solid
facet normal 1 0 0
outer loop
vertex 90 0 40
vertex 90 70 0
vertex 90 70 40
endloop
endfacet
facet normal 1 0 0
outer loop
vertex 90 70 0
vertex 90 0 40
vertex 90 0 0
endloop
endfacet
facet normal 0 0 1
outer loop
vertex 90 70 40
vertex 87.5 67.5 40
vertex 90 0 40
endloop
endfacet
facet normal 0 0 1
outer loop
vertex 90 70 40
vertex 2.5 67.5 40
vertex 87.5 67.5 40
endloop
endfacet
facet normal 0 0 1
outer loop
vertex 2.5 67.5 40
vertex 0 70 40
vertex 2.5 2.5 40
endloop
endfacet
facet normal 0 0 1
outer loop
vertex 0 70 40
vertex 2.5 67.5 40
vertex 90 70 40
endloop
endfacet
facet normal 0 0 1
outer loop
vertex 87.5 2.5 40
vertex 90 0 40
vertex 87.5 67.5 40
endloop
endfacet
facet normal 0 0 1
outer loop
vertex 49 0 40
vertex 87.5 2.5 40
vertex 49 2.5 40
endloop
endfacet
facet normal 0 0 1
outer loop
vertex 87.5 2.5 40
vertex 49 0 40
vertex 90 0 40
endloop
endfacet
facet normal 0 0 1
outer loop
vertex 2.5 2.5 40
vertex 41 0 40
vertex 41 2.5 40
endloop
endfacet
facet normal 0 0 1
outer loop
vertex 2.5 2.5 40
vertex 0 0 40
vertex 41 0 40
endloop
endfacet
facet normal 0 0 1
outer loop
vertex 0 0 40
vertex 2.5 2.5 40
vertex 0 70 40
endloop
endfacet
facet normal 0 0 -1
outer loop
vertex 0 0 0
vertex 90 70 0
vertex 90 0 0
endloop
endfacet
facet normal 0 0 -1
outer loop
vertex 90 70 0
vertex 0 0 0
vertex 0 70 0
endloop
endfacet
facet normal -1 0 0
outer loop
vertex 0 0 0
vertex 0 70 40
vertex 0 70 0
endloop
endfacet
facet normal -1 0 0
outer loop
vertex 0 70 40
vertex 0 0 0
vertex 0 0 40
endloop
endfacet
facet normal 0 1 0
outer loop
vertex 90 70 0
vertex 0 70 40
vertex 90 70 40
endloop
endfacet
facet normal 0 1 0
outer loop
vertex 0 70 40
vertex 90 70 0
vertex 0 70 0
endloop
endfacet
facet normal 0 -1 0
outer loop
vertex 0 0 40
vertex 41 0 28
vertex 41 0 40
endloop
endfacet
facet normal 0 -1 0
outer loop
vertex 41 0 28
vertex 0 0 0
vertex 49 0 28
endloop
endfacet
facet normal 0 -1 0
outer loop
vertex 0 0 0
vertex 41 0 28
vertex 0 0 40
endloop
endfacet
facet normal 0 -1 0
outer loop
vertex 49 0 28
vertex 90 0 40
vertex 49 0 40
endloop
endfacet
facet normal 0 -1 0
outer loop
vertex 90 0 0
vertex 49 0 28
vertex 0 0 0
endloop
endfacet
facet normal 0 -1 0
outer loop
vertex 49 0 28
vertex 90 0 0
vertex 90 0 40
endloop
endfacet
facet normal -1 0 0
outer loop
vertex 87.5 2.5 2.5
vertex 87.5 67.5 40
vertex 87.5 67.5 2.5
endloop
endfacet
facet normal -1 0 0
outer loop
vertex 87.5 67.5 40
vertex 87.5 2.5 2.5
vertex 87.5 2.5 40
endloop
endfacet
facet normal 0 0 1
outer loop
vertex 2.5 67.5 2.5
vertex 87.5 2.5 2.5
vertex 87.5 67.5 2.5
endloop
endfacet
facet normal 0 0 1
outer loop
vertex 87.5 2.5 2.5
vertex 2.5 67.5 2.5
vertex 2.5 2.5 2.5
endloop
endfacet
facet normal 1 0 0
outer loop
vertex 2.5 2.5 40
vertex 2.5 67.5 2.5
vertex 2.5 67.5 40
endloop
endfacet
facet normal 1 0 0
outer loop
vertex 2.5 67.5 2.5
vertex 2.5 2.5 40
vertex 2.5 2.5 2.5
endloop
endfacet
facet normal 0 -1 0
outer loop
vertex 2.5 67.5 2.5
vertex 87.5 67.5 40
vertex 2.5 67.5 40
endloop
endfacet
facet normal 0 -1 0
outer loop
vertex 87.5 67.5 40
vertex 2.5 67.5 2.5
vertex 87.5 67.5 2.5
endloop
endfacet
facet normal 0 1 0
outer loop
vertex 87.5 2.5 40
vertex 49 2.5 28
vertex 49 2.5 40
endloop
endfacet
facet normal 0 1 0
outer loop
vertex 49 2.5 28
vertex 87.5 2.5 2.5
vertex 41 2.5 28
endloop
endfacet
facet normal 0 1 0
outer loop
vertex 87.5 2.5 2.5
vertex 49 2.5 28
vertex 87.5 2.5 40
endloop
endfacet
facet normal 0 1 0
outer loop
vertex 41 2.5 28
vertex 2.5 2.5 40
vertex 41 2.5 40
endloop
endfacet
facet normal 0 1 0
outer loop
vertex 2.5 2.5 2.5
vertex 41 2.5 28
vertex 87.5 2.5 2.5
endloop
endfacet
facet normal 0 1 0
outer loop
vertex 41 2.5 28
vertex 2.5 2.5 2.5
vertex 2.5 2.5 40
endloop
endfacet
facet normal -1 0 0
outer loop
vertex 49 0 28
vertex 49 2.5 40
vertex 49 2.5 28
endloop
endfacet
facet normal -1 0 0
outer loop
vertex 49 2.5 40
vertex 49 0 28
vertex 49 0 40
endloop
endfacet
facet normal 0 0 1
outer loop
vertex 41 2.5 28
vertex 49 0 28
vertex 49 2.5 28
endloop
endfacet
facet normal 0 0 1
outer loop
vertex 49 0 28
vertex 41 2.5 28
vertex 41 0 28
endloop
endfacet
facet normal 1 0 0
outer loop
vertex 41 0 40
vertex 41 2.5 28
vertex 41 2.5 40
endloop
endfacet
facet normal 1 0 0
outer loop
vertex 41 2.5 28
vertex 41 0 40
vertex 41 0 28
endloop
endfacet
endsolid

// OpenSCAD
$fn = 32;

// ----------------------------------------------------------------------
// Enclosure box: notch enclosure
// ----------------------------------------------------------------------

// --- parameters (mm) ---
box_l = 90;               // outer length, X
box_w = 70;               // outer width, Y
box_h = 40;               // outer height
wall_t = 2.5;             // wall thickness
notch_w = 8;              // cable notch width
notch_h = 12;             // cable notch height

inner_h = box_h - wall_t;  // cavity depth
boss_h = inner_h - 2;  // corner boss height

difference() {
  cube([box_l, box_w, box_h]);
  translate([wall_t, wall_t, wall_t])
    cube([box_l - 2 * wall_t, box_w - 2 * wall_t, box_h]);
  translate([box_l / 2 - notch_w / 2, -1, box_h - notch_h])
    cube([notch_w, wall_t + 2, notch_h + 1]);
}
